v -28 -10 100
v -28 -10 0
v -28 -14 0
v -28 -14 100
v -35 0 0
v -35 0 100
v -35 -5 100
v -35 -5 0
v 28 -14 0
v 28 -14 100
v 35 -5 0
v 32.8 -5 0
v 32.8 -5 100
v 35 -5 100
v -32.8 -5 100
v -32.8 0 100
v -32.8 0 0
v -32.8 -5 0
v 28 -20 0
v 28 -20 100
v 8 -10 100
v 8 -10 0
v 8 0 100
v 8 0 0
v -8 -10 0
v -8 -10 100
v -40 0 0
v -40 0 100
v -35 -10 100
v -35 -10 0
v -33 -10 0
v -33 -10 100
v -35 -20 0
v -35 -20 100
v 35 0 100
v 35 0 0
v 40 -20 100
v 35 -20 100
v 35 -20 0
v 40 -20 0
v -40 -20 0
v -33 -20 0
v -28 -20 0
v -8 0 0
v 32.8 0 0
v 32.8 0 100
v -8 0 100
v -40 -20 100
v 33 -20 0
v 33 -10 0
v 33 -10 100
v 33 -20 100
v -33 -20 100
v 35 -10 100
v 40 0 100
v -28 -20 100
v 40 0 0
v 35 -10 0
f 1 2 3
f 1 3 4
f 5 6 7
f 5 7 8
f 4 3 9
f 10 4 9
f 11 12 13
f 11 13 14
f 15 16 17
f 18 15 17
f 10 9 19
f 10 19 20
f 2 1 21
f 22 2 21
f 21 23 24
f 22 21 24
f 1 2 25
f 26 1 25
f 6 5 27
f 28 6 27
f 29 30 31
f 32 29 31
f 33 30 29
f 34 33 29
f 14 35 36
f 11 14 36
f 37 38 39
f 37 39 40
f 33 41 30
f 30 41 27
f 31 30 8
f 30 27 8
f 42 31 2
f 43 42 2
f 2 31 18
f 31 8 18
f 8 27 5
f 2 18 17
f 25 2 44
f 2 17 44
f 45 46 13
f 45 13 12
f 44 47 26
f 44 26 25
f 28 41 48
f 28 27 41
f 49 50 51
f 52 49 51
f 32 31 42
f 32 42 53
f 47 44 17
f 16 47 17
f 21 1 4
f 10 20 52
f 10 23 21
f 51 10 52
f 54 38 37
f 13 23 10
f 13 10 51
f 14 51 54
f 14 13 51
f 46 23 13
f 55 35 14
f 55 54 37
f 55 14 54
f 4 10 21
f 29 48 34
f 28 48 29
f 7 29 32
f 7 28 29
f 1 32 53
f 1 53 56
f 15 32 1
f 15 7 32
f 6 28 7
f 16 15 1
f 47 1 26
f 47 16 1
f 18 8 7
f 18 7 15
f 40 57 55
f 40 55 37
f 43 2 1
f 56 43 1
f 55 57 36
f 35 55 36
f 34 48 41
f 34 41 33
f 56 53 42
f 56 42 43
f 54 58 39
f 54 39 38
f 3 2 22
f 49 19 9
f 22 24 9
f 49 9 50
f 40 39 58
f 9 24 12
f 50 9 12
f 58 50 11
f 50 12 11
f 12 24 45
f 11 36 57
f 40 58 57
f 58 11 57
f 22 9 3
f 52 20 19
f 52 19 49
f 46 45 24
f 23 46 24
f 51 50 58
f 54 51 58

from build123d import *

# Parameters (mm, degrees)
EXTRU_MINCE1_DEPTH      = 100
ESQUISSE4_W             = 2.2
ESQUISSE4_H             = 100
ENL_V_MAT_EXTRU_1_DEPTH = 5
ESQUISSE7_W             = 5
ESQUISSE7_H             = 100
BOSS_EXTRU_1_DEPTH      = 10
ESQUISSE8_W             = 16
ESQUISSE8_H             = 100
ENL_V_MAT_EXTRU_3_DEPTH = 11
ESQUISSE9_W             = 56
ESQUISSE9_H             = 100
BOSS_EXTRU_2_DEPTH      = 4


with BuildPart() as part:
    # Esquisse2 → Extru.-Mince1 (new body)
    with BuildSketch(Plane.XY):
        Polygon((-40, 0), (-10, 0), (10, 0), (40, 0), (40, -10), (10, -10), (-10, -10), (-40, -10), align=None)
    extrude(amount=EXTRU_MINCE1_DEPTH)

    # Esquisse4 → Enlèv. mat.-Extru.1 (cut)
    with BuildSketch(Plane(origin=(0, 0, 0), x_dir=(1, 0, 0), z_dir=(0, 1, 0))):
        with Locations((-33.9, -50)):
            Rectangle(ESQUISSE4_W, ESQUISSE4_H)
        with Locations((33.9, -50)):
            Rectangle(ESQUISSE4_W, ESQUISSE4_H)
    extrude(amount=-ENL_V_MAT_EXTRU_1_DEPTH, mode=Mode.SUBTRACT)

    # Esquisse7 → Boss.-Extru.1 (add)
    with BuildSketch(Plane.XZ.offset(10)):
        with Locations((-37.5, 50)):
            Rectangle(ESQUISSE7_W, ESQUISSE7_H)
        with Locations((-30.5, 50)):
            Rectangle(ESQUISSE7_W, ESQUISSE7_H)
        with Locations((37.5, 50)):
            Rectangle(ESQUISSE7_W, ESQUISSE7_H)
        with Locations((30.5, 50)):
            Rectangle(ESQUISSE7_W, ESQUISSE7_H)
    extrude(amount=BOSS_EXTRU_1_DEPTH)

    # Esquisse8 → Enlèv. mat.-Extru.3 (cut)
    with BuildSketch(Plane(origin=(0, 0, 0), x_dir=(1, 0, 0), z_dir=(0, 1, 0))):
        with Locations((0, -50)):
            Rectangle(ESQUISSE8_W, ESQUISSE8_H)
    extrude(amount=-ENL_V_MAT_EXTRU_3_DEPTH, mode=Mode.SUBTRACT)


with BuildPart() as enl_v_mat_extru_3_piece_1:
    # of the separate pieces the step leaves, piece 1, a body of its own (enl_v_mat_extru_3_pieces)
    add(part.part.solids().sort_by_distance((40, 0, 0))[0])

    # Esquisse9 → Boss.-Extru.2 (add)
    with BuildSketch(Plane.XZ.offset(10)):
        with Locations((0, 50)):
            Rectangle(ESQUISSE9_W, ESQUISSE9_H)
    extrude(amount=BOSS_EXTRU_2_DEPTH)


with BuildPart() as enl_v_mat_extru_3_piece_2:
    # of the separate pieces the step leaves, piece 2, a body of its own (enl_v_mat_extru_3_pieces)
    add(part.part.solids().sort_by_distance((-35, 0, 0))[0])


solid = Compound([enl_v_mat_extru_3_piece_1.part, enl_v_mat_extru_3_piece_2.part])
